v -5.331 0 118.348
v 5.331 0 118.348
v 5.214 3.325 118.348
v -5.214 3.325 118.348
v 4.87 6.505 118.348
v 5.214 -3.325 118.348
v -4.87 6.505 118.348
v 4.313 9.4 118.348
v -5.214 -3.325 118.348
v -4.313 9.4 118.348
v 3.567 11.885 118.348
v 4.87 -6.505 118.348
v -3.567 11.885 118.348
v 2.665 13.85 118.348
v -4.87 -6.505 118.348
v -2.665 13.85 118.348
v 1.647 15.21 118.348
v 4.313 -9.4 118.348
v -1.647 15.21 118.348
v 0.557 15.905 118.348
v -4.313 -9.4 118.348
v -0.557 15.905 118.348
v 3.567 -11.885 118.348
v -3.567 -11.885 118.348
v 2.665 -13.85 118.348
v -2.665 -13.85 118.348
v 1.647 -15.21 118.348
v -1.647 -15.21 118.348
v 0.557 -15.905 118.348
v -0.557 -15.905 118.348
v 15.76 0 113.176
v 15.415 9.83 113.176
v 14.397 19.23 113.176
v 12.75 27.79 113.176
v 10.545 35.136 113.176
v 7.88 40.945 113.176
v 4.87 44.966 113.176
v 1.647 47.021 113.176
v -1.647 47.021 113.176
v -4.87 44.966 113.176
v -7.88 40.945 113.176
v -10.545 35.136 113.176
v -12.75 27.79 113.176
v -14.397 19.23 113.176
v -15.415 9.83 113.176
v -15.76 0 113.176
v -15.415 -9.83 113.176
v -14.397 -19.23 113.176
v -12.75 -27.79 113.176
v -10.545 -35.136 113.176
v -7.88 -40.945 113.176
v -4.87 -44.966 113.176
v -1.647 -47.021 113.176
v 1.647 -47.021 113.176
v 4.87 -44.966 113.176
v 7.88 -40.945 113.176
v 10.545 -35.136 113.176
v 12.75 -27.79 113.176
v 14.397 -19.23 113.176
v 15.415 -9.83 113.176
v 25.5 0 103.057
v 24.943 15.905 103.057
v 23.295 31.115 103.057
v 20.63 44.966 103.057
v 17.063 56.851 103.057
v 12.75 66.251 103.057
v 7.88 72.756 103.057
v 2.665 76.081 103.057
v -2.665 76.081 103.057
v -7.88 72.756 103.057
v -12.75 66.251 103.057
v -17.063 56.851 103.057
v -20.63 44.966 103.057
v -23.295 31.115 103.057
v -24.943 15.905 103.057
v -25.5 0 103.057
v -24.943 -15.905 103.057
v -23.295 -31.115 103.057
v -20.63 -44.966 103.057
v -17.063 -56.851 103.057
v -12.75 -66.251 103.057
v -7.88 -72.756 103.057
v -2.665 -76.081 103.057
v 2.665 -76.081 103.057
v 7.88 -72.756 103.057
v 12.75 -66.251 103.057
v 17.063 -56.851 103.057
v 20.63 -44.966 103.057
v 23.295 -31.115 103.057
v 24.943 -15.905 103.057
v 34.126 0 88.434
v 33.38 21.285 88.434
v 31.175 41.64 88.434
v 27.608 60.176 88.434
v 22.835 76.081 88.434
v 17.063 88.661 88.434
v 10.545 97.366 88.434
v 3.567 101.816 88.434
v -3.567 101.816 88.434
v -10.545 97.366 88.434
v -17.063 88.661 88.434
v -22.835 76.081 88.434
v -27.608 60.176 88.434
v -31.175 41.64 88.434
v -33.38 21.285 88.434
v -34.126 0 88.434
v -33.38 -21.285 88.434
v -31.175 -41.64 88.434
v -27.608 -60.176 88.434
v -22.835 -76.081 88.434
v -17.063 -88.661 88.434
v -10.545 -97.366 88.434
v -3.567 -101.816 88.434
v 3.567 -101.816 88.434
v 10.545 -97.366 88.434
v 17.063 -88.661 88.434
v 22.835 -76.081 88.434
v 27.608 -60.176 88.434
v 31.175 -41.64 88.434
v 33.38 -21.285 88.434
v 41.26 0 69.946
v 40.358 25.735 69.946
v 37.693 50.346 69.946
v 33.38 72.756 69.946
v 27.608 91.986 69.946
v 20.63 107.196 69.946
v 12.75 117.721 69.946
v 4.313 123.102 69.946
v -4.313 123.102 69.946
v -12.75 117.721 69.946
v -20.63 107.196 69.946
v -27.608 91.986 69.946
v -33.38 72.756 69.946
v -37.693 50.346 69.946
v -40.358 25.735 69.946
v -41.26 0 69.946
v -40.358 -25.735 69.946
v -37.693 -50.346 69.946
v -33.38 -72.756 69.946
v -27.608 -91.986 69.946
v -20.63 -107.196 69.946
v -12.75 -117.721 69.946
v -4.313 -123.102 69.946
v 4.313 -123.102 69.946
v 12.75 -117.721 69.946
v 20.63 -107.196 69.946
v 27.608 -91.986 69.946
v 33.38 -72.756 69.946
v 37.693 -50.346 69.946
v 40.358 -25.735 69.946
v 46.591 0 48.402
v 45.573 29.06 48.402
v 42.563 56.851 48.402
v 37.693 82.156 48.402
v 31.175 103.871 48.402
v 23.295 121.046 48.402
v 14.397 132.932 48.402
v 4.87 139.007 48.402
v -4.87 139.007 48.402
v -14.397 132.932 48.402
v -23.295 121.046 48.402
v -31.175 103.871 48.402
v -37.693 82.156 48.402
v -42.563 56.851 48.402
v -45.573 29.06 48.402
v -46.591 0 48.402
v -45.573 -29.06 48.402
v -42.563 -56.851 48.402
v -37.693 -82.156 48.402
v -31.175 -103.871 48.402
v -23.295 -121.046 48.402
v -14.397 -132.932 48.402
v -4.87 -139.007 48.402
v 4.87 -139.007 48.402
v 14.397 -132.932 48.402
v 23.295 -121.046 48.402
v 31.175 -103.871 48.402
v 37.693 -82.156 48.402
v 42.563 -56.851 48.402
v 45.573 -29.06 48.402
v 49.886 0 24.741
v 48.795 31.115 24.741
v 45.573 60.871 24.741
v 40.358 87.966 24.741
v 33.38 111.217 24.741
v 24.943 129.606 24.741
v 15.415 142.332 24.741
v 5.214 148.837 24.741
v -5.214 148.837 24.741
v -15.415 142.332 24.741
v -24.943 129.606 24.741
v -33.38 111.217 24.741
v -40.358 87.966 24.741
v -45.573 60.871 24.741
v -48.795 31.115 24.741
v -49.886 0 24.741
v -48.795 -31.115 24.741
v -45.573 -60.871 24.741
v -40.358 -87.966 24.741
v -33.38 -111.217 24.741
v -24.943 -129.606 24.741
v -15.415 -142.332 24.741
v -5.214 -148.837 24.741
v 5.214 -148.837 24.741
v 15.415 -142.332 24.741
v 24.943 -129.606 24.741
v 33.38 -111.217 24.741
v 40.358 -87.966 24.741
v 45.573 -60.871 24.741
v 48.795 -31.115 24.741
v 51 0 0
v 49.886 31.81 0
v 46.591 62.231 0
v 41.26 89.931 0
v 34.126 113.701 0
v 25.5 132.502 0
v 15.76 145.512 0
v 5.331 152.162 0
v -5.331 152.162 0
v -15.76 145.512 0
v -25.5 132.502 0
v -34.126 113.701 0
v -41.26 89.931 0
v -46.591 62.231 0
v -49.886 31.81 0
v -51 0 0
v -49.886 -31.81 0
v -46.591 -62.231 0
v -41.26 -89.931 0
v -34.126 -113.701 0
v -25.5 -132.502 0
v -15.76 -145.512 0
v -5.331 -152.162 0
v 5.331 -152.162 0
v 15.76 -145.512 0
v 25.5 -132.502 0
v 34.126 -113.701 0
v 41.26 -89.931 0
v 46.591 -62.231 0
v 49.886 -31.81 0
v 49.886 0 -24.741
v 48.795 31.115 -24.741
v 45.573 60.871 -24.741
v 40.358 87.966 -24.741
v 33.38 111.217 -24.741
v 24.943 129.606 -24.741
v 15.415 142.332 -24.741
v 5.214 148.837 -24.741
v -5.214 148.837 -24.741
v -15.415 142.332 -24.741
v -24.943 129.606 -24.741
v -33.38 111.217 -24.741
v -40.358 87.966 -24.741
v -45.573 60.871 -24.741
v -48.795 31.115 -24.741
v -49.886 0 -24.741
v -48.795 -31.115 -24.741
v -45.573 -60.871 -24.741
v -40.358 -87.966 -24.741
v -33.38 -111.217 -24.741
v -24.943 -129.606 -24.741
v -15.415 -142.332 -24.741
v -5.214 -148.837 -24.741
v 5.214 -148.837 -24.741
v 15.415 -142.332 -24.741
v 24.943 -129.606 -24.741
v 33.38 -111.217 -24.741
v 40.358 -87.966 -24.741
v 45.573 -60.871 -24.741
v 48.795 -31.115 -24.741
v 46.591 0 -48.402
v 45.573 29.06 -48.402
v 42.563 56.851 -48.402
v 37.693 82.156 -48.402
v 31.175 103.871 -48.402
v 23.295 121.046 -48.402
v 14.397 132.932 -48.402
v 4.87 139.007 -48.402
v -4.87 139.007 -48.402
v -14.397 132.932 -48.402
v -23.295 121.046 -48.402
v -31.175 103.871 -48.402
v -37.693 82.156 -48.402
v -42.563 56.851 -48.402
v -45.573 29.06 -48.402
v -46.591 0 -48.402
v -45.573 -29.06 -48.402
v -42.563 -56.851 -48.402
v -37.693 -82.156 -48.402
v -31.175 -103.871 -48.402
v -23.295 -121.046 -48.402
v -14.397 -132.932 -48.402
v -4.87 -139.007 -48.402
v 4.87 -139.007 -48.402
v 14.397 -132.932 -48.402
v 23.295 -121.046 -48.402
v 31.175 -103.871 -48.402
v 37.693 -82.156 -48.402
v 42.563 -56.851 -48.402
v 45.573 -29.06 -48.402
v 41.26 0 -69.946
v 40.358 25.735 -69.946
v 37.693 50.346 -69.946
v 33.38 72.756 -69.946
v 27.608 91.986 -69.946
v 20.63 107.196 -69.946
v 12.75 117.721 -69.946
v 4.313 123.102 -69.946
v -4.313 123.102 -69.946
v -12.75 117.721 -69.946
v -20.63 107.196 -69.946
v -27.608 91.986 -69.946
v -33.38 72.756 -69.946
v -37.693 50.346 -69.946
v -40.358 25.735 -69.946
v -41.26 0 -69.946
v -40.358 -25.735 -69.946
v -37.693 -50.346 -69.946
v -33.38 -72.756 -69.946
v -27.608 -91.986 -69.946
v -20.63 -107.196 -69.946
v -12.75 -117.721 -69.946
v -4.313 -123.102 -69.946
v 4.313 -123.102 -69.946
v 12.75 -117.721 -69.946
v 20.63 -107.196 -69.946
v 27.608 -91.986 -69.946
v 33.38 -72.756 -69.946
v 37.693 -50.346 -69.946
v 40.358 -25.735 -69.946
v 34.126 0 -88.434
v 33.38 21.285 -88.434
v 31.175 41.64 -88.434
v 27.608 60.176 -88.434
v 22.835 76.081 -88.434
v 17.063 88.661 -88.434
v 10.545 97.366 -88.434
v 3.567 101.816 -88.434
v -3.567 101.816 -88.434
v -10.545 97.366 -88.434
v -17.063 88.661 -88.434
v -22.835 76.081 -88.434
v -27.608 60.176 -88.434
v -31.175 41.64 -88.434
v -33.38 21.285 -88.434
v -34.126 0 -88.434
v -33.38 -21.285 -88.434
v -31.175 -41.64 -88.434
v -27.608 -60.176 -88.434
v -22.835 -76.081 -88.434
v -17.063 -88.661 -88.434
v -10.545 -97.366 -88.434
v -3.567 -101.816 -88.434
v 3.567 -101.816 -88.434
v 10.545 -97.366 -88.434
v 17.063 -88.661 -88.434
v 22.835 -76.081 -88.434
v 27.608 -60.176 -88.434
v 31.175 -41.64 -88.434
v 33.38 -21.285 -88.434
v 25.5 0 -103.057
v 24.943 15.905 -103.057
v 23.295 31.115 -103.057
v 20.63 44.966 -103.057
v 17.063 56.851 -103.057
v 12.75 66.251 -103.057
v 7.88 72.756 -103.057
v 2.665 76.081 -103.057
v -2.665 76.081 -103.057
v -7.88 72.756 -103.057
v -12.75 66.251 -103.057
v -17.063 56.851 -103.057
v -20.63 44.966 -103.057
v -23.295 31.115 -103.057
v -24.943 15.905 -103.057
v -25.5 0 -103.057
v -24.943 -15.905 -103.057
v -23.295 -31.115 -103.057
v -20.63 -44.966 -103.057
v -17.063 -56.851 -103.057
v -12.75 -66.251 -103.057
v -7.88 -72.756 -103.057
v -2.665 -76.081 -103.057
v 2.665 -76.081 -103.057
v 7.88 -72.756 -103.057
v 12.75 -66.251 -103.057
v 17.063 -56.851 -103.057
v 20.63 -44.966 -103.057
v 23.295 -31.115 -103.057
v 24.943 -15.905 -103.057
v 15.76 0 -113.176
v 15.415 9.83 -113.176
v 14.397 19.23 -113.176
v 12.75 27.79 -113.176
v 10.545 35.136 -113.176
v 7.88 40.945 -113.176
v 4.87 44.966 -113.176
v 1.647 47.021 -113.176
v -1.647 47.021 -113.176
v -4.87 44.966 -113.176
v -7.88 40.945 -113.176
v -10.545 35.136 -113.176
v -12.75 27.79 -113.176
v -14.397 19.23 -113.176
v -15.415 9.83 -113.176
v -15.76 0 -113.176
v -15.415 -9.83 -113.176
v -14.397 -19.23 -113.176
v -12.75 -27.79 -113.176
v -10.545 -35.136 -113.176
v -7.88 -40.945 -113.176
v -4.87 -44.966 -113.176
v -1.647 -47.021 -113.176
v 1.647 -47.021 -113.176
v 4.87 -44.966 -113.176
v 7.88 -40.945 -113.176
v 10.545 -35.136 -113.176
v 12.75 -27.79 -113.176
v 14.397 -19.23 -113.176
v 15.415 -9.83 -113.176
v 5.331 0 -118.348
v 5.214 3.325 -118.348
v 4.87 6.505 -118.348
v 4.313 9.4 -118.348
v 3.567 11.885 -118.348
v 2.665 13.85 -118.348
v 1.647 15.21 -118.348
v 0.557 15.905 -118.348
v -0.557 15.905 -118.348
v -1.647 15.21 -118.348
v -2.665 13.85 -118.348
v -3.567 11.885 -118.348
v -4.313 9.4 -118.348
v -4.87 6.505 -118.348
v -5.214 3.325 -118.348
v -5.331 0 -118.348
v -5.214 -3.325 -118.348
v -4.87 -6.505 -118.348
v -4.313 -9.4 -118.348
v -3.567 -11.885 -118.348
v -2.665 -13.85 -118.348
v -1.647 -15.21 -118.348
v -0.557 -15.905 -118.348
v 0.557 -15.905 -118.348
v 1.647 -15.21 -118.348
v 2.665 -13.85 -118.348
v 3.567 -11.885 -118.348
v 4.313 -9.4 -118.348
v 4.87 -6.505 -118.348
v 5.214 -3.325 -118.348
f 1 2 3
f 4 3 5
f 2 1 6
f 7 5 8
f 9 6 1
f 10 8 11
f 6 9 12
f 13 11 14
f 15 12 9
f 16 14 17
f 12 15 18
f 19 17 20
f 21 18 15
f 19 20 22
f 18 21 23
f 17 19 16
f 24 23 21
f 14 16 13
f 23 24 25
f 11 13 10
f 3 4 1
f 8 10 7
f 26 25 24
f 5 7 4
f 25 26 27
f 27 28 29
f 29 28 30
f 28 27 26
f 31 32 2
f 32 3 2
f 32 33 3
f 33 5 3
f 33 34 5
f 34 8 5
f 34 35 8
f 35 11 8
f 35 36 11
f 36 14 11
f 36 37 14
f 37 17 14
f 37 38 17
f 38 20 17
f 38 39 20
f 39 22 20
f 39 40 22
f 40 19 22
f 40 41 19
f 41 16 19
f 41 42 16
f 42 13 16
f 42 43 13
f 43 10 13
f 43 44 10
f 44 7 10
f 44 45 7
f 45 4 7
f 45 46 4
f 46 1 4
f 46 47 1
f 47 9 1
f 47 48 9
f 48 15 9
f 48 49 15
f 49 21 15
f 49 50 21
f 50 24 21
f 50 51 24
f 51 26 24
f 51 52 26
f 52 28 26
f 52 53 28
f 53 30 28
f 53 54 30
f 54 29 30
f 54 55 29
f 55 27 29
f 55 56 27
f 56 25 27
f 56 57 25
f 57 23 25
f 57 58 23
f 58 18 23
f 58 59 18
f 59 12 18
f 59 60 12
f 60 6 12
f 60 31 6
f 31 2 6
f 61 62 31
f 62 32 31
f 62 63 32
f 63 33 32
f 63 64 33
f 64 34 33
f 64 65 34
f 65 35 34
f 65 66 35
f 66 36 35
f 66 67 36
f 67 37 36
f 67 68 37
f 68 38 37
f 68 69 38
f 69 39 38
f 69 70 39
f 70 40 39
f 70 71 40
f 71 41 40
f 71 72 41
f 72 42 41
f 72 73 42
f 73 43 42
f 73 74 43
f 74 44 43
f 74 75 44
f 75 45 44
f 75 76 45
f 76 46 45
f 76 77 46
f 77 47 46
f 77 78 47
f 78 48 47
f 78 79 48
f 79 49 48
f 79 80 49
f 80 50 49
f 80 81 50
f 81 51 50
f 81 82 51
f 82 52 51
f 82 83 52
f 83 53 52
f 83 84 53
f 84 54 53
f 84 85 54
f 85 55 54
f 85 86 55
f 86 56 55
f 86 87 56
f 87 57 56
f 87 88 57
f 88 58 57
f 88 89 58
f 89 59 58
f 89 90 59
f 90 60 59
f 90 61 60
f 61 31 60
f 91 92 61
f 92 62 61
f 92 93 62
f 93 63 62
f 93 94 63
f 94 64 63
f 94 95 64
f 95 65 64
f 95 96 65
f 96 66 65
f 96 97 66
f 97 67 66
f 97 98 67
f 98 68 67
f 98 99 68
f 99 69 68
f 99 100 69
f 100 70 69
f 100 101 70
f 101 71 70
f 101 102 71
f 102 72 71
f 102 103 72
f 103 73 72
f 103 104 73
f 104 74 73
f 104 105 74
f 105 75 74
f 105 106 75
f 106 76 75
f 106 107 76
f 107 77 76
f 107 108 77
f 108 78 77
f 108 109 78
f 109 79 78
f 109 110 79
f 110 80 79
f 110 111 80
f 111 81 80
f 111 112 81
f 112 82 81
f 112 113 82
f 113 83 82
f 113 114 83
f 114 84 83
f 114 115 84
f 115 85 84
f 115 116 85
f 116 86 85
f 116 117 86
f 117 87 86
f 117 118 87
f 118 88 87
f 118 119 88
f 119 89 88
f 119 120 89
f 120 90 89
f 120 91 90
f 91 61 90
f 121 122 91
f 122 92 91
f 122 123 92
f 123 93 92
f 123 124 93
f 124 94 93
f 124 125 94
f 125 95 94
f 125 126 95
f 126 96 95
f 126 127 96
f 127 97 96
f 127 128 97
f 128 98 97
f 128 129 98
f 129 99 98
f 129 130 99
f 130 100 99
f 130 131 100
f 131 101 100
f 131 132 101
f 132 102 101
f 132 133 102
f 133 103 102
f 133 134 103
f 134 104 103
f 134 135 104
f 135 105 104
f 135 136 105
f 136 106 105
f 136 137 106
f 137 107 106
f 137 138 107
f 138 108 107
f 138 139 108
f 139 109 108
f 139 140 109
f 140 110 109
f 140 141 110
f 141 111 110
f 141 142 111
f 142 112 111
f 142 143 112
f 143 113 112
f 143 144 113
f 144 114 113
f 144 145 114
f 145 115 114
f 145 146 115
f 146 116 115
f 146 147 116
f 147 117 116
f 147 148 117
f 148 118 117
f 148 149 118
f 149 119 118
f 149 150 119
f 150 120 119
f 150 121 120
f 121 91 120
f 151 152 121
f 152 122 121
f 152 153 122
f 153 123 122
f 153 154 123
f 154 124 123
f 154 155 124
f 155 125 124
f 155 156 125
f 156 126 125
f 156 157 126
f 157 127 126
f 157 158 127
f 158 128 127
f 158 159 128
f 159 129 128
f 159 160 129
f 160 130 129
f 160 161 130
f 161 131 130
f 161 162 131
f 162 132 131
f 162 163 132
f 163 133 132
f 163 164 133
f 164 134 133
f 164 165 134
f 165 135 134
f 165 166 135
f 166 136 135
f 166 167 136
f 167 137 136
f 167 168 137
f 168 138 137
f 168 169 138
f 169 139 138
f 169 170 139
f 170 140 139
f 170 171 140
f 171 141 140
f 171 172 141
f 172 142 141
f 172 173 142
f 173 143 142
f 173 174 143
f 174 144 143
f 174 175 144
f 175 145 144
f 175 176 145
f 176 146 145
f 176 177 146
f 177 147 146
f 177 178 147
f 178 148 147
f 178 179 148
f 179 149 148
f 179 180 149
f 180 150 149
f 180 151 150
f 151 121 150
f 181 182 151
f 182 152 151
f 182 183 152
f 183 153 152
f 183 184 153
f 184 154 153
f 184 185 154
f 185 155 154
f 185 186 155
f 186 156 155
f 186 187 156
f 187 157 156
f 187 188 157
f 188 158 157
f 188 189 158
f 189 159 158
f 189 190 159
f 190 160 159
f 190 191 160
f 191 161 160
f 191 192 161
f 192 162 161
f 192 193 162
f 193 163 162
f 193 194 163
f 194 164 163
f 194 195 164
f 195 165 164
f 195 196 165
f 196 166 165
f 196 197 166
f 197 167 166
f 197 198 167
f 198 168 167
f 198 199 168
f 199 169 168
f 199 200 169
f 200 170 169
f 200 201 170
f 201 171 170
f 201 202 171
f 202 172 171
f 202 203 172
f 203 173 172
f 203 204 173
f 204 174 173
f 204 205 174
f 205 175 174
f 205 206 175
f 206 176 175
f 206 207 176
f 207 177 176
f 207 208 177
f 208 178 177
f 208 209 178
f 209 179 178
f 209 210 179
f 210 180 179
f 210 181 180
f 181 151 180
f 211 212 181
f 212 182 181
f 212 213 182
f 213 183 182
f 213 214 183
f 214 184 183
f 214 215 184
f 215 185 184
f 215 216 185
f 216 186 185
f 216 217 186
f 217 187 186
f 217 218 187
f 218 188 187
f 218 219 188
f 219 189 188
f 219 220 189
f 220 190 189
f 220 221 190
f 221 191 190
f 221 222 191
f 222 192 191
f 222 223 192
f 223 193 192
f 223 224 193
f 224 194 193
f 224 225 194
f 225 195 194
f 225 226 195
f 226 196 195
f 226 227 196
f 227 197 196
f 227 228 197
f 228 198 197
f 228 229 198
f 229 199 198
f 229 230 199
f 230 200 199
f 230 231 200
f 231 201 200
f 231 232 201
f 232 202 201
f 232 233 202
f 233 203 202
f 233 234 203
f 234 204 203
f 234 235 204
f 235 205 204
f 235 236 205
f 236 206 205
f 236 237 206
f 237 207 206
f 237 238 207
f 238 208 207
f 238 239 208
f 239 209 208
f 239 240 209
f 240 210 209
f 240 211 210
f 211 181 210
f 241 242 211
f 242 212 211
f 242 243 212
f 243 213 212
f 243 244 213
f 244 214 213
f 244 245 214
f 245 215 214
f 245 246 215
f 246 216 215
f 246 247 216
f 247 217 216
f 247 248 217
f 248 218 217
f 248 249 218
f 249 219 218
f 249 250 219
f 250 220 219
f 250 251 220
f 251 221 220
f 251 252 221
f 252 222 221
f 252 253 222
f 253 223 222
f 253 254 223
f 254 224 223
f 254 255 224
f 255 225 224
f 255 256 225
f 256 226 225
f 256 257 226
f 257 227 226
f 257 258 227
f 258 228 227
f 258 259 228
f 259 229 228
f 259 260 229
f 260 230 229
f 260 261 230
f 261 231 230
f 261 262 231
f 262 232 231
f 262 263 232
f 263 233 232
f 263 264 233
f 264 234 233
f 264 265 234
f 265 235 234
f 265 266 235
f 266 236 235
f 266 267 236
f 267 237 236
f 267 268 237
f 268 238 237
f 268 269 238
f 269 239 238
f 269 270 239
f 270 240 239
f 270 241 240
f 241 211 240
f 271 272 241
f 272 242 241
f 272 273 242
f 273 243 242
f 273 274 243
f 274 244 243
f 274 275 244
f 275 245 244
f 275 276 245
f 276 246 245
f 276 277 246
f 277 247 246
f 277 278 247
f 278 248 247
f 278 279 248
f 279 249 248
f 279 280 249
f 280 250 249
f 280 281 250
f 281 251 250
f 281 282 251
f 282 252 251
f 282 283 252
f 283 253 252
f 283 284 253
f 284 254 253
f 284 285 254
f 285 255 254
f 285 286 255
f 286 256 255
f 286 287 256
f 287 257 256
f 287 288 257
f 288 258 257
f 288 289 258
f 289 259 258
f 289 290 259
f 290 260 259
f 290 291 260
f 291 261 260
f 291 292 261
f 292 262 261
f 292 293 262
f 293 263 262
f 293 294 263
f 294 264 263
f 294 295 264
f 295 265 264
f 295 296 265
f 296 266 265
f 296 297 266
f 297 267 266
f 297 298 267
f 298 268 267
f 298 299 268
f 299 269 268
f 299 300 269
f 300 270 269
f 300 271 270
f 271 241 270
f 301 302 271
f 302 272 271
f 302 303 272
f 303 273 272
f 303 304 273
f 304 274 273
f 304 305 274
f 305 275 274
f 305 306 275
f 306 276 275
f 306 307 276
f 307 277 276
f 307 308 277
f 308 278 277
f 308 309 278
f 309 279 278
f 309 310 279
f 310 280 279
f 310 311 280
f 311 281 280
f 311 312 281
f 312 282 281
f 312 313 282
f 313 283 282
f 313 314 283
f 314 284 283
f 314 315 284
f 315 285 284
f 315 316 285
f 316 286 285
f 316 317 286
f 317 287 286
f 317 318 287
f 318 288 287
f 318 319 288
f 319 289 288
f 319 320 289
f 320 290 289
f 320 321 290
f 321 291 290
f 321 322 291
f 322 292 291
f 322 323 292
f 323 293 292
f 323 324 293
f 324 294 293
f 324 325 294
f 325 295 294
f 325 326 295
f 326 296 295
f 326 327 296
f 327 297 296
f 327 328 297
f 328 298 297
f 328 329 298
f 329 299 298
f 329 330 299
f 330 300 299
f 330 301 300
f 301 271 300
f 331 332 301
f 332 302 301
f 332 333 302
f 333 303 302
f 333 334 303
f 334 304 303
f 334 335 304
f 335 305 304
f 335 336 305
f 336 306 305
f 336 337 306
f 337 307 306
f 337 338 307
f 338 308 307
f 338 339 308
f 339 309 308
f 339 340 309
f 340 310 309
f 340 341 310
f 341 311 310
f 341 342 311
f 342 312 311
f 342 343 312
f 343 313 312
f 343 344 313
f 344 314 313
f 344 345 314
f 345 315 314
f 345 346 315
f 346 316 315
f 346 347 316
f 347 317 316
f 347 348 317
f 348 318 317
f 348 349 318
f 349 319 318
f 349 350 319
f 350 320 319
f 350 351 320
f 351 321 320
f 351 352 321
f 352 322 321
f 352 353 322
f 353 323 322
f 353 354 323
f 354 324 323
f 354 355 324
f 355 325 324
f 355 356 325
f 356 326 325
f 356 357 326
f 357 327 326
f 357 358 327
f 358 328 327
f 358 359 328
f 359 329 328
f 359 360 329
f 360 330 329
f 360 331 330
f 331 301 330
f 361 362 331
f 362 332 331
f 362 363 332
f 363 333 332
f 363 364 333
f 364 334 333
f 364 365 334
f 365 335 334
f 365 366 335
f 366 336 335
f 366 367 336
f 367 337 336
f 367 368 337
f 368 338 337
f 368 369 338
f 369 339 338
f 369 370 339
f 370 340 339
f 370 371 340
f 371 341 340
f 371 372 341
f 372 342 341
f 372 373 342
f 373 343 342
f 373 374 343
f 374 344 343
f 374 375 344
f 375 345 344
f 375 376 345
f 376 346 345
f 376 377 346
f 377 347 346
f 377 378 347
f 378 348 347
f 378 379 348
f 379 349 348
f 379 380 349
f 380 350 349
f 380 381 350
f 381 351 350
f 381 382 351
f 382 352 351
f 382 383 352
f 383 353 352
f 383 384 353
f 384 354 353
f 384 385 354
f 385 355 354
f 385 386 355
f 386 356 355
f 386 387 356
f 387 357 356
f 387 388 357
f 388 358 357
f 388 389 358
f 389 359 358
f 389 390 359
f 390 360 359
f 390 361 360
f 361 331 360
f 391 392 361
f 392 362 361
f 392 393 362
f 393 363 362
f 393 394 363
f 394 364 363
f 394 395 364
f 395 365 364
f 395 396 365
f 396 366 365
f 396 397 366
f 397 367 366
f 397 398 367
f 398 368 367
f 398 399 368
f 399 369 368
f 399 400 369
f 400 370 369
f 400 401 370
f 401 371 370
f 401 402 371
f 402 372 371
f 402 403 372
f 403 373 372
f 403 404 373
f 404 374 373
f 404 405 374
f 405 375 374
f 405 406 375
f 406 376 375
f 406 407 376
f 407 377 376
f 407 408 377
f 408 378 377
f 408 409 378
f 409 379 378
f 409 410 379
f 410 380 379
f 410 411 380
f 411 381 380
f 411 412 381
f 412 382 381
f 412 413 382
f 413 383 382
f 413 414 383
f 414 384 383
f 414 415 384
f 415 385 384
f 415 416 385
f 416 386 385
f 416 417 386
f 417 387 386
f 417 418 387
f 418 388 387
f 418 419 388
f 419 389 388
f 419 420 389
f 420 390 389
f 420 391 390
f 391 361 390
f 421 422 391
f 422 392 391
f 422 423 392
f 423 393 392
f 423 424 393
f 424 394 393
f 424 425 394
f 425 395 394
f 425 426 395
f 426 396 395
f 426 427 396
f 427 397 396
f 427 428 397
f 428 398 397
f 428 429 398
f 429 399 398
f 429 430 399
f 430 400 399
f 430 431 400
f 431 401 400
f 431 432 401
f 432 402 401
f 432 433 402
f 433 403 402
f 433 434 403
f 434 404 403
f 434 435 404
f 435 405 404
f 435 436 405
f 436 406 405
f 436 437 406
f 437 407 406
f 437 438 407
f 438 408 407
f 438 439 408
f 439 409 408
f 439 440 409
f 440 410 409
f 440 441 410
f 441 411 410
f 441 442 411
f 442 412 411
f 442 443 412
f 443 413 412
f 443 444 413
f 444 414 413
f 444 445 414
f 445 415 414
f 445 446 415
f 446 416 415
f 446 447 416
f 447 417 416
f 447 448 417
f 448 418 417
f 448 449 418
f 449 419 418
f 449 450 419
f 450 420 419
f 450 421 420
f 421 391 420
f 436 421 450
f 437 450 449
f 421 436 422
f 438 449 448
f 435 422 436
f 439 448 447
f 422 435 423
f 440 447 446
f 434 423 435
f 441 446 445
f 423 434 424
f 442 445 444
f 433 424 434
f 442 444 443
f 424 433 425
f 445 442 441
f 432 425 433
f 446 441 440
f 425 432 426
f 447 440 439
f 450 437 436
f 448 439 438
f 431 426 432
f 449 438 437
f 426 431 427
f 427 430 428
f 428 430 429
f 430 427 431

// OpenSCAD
// Generated by SolidPython 1.0.1 on 2020-07-29 00:46:45


scale(v = [3, 9, 7]) {
	sphere(r = 17);
}
/***********************************************
*********      SolidPython code:      **********
************************************************
 
# import packages: SolidPython
from solid import *
from solid.utils import *
from itertools import chain, combinations, permutations


class Resize:

    def __init__(self, scad_file):
        self.scad_file = scad_file
        #self.scad_file = import_scad(scad_file)
        # cone/cylinder param:
        self.r1 = 0
        self.r2 = 0
        self.h = 0
        # rectangular prism param:
        self.w = 0
        self.l = 0
        # ellipse param:
        self.r = 0

    # import OpenScad code (file name corresponds to shape)


    # classify shape + parameters
    def assign(self, param1, param2, param3):
        if self.scad_file == 'cone.scad':
            self.r1 = param1
            self.r2 = param2
            self.h = param3
        elif self.scad_file == 'cylinder.scad':
            self.r1 = param1
            self.r2 = param2
            self.h = param3
        elif self.scad_file == 'rectangularPrism.scad':
            self.h = param1
            self.l = param2
            self.w = param3
        else:
            self.r = param1
            self.h = param2

    # resize parameters
    def iterate(self):
        x = range(3, 20, 2)
        i = 1
        if self.scad_file == 'cone.scad':
            tempList = list(permutations(x, 2))
            for temp in tempList:
                param1 = temp[0]
                param2 = temp[1]
                filepath = 'produced_scad_files/' + 'cone' + str(param1) + '_' + str(param2) + '_' + '.scad'
                scad_render_to_file(cylinder(h=param1, r1=param2, r2=0), filepath)

        elif self.scad_file == 'cylinder.scad':
            tempList = list(permutations(x, 3))
            for temp in tempList:
                param1 = temp[0]
                param2 = temp[1]
                filepath = 'produced_scad_files/' + 'cylinder' + str(param1) + '_' + str(param2) + '_' + '.scad'
                scad_render_to_file(cylinder(h=param1, r1=param2, r2=param2), filepath)

        elif self.scad_file == 'rectangularPrism.scad':
            tempList = list(permutations(x, 3))
            for temp in tempList:
                param1 = temp[0]
                param2 = temp[1]
                param3 = temp[2]
                filepath = 'produced_scad_files/' + 'rectangularPrism' + str(param1) + '_' + str(param2) + '_' + str(
                    param3) + '.scad'
                scad_render_to_file(cube(size=(param1, param2, param3)), filepath)

        elif self.scad_file == 'ellipse.scad':
            tempList = list(permutations(x, 4))
            for temp in tempList:
                param1 = temp[0]
                param2 = temp[1]
                param3 = temp[2]
                param4 = temp[3]
                filepath = 'produced_scad_files/' + 'ellipse' + str(param1) + '_' + str(param2) + '_' + str(param3) + '_' + str(param4) + '.scad'
                scad_render_to_file(scale([param1, param2, param3])(sphere(r=param4)), filepath)

    def render_to_scadfile(self):
        scad_render_to_file(scad, 'example.scad') 
 
************************************************/
